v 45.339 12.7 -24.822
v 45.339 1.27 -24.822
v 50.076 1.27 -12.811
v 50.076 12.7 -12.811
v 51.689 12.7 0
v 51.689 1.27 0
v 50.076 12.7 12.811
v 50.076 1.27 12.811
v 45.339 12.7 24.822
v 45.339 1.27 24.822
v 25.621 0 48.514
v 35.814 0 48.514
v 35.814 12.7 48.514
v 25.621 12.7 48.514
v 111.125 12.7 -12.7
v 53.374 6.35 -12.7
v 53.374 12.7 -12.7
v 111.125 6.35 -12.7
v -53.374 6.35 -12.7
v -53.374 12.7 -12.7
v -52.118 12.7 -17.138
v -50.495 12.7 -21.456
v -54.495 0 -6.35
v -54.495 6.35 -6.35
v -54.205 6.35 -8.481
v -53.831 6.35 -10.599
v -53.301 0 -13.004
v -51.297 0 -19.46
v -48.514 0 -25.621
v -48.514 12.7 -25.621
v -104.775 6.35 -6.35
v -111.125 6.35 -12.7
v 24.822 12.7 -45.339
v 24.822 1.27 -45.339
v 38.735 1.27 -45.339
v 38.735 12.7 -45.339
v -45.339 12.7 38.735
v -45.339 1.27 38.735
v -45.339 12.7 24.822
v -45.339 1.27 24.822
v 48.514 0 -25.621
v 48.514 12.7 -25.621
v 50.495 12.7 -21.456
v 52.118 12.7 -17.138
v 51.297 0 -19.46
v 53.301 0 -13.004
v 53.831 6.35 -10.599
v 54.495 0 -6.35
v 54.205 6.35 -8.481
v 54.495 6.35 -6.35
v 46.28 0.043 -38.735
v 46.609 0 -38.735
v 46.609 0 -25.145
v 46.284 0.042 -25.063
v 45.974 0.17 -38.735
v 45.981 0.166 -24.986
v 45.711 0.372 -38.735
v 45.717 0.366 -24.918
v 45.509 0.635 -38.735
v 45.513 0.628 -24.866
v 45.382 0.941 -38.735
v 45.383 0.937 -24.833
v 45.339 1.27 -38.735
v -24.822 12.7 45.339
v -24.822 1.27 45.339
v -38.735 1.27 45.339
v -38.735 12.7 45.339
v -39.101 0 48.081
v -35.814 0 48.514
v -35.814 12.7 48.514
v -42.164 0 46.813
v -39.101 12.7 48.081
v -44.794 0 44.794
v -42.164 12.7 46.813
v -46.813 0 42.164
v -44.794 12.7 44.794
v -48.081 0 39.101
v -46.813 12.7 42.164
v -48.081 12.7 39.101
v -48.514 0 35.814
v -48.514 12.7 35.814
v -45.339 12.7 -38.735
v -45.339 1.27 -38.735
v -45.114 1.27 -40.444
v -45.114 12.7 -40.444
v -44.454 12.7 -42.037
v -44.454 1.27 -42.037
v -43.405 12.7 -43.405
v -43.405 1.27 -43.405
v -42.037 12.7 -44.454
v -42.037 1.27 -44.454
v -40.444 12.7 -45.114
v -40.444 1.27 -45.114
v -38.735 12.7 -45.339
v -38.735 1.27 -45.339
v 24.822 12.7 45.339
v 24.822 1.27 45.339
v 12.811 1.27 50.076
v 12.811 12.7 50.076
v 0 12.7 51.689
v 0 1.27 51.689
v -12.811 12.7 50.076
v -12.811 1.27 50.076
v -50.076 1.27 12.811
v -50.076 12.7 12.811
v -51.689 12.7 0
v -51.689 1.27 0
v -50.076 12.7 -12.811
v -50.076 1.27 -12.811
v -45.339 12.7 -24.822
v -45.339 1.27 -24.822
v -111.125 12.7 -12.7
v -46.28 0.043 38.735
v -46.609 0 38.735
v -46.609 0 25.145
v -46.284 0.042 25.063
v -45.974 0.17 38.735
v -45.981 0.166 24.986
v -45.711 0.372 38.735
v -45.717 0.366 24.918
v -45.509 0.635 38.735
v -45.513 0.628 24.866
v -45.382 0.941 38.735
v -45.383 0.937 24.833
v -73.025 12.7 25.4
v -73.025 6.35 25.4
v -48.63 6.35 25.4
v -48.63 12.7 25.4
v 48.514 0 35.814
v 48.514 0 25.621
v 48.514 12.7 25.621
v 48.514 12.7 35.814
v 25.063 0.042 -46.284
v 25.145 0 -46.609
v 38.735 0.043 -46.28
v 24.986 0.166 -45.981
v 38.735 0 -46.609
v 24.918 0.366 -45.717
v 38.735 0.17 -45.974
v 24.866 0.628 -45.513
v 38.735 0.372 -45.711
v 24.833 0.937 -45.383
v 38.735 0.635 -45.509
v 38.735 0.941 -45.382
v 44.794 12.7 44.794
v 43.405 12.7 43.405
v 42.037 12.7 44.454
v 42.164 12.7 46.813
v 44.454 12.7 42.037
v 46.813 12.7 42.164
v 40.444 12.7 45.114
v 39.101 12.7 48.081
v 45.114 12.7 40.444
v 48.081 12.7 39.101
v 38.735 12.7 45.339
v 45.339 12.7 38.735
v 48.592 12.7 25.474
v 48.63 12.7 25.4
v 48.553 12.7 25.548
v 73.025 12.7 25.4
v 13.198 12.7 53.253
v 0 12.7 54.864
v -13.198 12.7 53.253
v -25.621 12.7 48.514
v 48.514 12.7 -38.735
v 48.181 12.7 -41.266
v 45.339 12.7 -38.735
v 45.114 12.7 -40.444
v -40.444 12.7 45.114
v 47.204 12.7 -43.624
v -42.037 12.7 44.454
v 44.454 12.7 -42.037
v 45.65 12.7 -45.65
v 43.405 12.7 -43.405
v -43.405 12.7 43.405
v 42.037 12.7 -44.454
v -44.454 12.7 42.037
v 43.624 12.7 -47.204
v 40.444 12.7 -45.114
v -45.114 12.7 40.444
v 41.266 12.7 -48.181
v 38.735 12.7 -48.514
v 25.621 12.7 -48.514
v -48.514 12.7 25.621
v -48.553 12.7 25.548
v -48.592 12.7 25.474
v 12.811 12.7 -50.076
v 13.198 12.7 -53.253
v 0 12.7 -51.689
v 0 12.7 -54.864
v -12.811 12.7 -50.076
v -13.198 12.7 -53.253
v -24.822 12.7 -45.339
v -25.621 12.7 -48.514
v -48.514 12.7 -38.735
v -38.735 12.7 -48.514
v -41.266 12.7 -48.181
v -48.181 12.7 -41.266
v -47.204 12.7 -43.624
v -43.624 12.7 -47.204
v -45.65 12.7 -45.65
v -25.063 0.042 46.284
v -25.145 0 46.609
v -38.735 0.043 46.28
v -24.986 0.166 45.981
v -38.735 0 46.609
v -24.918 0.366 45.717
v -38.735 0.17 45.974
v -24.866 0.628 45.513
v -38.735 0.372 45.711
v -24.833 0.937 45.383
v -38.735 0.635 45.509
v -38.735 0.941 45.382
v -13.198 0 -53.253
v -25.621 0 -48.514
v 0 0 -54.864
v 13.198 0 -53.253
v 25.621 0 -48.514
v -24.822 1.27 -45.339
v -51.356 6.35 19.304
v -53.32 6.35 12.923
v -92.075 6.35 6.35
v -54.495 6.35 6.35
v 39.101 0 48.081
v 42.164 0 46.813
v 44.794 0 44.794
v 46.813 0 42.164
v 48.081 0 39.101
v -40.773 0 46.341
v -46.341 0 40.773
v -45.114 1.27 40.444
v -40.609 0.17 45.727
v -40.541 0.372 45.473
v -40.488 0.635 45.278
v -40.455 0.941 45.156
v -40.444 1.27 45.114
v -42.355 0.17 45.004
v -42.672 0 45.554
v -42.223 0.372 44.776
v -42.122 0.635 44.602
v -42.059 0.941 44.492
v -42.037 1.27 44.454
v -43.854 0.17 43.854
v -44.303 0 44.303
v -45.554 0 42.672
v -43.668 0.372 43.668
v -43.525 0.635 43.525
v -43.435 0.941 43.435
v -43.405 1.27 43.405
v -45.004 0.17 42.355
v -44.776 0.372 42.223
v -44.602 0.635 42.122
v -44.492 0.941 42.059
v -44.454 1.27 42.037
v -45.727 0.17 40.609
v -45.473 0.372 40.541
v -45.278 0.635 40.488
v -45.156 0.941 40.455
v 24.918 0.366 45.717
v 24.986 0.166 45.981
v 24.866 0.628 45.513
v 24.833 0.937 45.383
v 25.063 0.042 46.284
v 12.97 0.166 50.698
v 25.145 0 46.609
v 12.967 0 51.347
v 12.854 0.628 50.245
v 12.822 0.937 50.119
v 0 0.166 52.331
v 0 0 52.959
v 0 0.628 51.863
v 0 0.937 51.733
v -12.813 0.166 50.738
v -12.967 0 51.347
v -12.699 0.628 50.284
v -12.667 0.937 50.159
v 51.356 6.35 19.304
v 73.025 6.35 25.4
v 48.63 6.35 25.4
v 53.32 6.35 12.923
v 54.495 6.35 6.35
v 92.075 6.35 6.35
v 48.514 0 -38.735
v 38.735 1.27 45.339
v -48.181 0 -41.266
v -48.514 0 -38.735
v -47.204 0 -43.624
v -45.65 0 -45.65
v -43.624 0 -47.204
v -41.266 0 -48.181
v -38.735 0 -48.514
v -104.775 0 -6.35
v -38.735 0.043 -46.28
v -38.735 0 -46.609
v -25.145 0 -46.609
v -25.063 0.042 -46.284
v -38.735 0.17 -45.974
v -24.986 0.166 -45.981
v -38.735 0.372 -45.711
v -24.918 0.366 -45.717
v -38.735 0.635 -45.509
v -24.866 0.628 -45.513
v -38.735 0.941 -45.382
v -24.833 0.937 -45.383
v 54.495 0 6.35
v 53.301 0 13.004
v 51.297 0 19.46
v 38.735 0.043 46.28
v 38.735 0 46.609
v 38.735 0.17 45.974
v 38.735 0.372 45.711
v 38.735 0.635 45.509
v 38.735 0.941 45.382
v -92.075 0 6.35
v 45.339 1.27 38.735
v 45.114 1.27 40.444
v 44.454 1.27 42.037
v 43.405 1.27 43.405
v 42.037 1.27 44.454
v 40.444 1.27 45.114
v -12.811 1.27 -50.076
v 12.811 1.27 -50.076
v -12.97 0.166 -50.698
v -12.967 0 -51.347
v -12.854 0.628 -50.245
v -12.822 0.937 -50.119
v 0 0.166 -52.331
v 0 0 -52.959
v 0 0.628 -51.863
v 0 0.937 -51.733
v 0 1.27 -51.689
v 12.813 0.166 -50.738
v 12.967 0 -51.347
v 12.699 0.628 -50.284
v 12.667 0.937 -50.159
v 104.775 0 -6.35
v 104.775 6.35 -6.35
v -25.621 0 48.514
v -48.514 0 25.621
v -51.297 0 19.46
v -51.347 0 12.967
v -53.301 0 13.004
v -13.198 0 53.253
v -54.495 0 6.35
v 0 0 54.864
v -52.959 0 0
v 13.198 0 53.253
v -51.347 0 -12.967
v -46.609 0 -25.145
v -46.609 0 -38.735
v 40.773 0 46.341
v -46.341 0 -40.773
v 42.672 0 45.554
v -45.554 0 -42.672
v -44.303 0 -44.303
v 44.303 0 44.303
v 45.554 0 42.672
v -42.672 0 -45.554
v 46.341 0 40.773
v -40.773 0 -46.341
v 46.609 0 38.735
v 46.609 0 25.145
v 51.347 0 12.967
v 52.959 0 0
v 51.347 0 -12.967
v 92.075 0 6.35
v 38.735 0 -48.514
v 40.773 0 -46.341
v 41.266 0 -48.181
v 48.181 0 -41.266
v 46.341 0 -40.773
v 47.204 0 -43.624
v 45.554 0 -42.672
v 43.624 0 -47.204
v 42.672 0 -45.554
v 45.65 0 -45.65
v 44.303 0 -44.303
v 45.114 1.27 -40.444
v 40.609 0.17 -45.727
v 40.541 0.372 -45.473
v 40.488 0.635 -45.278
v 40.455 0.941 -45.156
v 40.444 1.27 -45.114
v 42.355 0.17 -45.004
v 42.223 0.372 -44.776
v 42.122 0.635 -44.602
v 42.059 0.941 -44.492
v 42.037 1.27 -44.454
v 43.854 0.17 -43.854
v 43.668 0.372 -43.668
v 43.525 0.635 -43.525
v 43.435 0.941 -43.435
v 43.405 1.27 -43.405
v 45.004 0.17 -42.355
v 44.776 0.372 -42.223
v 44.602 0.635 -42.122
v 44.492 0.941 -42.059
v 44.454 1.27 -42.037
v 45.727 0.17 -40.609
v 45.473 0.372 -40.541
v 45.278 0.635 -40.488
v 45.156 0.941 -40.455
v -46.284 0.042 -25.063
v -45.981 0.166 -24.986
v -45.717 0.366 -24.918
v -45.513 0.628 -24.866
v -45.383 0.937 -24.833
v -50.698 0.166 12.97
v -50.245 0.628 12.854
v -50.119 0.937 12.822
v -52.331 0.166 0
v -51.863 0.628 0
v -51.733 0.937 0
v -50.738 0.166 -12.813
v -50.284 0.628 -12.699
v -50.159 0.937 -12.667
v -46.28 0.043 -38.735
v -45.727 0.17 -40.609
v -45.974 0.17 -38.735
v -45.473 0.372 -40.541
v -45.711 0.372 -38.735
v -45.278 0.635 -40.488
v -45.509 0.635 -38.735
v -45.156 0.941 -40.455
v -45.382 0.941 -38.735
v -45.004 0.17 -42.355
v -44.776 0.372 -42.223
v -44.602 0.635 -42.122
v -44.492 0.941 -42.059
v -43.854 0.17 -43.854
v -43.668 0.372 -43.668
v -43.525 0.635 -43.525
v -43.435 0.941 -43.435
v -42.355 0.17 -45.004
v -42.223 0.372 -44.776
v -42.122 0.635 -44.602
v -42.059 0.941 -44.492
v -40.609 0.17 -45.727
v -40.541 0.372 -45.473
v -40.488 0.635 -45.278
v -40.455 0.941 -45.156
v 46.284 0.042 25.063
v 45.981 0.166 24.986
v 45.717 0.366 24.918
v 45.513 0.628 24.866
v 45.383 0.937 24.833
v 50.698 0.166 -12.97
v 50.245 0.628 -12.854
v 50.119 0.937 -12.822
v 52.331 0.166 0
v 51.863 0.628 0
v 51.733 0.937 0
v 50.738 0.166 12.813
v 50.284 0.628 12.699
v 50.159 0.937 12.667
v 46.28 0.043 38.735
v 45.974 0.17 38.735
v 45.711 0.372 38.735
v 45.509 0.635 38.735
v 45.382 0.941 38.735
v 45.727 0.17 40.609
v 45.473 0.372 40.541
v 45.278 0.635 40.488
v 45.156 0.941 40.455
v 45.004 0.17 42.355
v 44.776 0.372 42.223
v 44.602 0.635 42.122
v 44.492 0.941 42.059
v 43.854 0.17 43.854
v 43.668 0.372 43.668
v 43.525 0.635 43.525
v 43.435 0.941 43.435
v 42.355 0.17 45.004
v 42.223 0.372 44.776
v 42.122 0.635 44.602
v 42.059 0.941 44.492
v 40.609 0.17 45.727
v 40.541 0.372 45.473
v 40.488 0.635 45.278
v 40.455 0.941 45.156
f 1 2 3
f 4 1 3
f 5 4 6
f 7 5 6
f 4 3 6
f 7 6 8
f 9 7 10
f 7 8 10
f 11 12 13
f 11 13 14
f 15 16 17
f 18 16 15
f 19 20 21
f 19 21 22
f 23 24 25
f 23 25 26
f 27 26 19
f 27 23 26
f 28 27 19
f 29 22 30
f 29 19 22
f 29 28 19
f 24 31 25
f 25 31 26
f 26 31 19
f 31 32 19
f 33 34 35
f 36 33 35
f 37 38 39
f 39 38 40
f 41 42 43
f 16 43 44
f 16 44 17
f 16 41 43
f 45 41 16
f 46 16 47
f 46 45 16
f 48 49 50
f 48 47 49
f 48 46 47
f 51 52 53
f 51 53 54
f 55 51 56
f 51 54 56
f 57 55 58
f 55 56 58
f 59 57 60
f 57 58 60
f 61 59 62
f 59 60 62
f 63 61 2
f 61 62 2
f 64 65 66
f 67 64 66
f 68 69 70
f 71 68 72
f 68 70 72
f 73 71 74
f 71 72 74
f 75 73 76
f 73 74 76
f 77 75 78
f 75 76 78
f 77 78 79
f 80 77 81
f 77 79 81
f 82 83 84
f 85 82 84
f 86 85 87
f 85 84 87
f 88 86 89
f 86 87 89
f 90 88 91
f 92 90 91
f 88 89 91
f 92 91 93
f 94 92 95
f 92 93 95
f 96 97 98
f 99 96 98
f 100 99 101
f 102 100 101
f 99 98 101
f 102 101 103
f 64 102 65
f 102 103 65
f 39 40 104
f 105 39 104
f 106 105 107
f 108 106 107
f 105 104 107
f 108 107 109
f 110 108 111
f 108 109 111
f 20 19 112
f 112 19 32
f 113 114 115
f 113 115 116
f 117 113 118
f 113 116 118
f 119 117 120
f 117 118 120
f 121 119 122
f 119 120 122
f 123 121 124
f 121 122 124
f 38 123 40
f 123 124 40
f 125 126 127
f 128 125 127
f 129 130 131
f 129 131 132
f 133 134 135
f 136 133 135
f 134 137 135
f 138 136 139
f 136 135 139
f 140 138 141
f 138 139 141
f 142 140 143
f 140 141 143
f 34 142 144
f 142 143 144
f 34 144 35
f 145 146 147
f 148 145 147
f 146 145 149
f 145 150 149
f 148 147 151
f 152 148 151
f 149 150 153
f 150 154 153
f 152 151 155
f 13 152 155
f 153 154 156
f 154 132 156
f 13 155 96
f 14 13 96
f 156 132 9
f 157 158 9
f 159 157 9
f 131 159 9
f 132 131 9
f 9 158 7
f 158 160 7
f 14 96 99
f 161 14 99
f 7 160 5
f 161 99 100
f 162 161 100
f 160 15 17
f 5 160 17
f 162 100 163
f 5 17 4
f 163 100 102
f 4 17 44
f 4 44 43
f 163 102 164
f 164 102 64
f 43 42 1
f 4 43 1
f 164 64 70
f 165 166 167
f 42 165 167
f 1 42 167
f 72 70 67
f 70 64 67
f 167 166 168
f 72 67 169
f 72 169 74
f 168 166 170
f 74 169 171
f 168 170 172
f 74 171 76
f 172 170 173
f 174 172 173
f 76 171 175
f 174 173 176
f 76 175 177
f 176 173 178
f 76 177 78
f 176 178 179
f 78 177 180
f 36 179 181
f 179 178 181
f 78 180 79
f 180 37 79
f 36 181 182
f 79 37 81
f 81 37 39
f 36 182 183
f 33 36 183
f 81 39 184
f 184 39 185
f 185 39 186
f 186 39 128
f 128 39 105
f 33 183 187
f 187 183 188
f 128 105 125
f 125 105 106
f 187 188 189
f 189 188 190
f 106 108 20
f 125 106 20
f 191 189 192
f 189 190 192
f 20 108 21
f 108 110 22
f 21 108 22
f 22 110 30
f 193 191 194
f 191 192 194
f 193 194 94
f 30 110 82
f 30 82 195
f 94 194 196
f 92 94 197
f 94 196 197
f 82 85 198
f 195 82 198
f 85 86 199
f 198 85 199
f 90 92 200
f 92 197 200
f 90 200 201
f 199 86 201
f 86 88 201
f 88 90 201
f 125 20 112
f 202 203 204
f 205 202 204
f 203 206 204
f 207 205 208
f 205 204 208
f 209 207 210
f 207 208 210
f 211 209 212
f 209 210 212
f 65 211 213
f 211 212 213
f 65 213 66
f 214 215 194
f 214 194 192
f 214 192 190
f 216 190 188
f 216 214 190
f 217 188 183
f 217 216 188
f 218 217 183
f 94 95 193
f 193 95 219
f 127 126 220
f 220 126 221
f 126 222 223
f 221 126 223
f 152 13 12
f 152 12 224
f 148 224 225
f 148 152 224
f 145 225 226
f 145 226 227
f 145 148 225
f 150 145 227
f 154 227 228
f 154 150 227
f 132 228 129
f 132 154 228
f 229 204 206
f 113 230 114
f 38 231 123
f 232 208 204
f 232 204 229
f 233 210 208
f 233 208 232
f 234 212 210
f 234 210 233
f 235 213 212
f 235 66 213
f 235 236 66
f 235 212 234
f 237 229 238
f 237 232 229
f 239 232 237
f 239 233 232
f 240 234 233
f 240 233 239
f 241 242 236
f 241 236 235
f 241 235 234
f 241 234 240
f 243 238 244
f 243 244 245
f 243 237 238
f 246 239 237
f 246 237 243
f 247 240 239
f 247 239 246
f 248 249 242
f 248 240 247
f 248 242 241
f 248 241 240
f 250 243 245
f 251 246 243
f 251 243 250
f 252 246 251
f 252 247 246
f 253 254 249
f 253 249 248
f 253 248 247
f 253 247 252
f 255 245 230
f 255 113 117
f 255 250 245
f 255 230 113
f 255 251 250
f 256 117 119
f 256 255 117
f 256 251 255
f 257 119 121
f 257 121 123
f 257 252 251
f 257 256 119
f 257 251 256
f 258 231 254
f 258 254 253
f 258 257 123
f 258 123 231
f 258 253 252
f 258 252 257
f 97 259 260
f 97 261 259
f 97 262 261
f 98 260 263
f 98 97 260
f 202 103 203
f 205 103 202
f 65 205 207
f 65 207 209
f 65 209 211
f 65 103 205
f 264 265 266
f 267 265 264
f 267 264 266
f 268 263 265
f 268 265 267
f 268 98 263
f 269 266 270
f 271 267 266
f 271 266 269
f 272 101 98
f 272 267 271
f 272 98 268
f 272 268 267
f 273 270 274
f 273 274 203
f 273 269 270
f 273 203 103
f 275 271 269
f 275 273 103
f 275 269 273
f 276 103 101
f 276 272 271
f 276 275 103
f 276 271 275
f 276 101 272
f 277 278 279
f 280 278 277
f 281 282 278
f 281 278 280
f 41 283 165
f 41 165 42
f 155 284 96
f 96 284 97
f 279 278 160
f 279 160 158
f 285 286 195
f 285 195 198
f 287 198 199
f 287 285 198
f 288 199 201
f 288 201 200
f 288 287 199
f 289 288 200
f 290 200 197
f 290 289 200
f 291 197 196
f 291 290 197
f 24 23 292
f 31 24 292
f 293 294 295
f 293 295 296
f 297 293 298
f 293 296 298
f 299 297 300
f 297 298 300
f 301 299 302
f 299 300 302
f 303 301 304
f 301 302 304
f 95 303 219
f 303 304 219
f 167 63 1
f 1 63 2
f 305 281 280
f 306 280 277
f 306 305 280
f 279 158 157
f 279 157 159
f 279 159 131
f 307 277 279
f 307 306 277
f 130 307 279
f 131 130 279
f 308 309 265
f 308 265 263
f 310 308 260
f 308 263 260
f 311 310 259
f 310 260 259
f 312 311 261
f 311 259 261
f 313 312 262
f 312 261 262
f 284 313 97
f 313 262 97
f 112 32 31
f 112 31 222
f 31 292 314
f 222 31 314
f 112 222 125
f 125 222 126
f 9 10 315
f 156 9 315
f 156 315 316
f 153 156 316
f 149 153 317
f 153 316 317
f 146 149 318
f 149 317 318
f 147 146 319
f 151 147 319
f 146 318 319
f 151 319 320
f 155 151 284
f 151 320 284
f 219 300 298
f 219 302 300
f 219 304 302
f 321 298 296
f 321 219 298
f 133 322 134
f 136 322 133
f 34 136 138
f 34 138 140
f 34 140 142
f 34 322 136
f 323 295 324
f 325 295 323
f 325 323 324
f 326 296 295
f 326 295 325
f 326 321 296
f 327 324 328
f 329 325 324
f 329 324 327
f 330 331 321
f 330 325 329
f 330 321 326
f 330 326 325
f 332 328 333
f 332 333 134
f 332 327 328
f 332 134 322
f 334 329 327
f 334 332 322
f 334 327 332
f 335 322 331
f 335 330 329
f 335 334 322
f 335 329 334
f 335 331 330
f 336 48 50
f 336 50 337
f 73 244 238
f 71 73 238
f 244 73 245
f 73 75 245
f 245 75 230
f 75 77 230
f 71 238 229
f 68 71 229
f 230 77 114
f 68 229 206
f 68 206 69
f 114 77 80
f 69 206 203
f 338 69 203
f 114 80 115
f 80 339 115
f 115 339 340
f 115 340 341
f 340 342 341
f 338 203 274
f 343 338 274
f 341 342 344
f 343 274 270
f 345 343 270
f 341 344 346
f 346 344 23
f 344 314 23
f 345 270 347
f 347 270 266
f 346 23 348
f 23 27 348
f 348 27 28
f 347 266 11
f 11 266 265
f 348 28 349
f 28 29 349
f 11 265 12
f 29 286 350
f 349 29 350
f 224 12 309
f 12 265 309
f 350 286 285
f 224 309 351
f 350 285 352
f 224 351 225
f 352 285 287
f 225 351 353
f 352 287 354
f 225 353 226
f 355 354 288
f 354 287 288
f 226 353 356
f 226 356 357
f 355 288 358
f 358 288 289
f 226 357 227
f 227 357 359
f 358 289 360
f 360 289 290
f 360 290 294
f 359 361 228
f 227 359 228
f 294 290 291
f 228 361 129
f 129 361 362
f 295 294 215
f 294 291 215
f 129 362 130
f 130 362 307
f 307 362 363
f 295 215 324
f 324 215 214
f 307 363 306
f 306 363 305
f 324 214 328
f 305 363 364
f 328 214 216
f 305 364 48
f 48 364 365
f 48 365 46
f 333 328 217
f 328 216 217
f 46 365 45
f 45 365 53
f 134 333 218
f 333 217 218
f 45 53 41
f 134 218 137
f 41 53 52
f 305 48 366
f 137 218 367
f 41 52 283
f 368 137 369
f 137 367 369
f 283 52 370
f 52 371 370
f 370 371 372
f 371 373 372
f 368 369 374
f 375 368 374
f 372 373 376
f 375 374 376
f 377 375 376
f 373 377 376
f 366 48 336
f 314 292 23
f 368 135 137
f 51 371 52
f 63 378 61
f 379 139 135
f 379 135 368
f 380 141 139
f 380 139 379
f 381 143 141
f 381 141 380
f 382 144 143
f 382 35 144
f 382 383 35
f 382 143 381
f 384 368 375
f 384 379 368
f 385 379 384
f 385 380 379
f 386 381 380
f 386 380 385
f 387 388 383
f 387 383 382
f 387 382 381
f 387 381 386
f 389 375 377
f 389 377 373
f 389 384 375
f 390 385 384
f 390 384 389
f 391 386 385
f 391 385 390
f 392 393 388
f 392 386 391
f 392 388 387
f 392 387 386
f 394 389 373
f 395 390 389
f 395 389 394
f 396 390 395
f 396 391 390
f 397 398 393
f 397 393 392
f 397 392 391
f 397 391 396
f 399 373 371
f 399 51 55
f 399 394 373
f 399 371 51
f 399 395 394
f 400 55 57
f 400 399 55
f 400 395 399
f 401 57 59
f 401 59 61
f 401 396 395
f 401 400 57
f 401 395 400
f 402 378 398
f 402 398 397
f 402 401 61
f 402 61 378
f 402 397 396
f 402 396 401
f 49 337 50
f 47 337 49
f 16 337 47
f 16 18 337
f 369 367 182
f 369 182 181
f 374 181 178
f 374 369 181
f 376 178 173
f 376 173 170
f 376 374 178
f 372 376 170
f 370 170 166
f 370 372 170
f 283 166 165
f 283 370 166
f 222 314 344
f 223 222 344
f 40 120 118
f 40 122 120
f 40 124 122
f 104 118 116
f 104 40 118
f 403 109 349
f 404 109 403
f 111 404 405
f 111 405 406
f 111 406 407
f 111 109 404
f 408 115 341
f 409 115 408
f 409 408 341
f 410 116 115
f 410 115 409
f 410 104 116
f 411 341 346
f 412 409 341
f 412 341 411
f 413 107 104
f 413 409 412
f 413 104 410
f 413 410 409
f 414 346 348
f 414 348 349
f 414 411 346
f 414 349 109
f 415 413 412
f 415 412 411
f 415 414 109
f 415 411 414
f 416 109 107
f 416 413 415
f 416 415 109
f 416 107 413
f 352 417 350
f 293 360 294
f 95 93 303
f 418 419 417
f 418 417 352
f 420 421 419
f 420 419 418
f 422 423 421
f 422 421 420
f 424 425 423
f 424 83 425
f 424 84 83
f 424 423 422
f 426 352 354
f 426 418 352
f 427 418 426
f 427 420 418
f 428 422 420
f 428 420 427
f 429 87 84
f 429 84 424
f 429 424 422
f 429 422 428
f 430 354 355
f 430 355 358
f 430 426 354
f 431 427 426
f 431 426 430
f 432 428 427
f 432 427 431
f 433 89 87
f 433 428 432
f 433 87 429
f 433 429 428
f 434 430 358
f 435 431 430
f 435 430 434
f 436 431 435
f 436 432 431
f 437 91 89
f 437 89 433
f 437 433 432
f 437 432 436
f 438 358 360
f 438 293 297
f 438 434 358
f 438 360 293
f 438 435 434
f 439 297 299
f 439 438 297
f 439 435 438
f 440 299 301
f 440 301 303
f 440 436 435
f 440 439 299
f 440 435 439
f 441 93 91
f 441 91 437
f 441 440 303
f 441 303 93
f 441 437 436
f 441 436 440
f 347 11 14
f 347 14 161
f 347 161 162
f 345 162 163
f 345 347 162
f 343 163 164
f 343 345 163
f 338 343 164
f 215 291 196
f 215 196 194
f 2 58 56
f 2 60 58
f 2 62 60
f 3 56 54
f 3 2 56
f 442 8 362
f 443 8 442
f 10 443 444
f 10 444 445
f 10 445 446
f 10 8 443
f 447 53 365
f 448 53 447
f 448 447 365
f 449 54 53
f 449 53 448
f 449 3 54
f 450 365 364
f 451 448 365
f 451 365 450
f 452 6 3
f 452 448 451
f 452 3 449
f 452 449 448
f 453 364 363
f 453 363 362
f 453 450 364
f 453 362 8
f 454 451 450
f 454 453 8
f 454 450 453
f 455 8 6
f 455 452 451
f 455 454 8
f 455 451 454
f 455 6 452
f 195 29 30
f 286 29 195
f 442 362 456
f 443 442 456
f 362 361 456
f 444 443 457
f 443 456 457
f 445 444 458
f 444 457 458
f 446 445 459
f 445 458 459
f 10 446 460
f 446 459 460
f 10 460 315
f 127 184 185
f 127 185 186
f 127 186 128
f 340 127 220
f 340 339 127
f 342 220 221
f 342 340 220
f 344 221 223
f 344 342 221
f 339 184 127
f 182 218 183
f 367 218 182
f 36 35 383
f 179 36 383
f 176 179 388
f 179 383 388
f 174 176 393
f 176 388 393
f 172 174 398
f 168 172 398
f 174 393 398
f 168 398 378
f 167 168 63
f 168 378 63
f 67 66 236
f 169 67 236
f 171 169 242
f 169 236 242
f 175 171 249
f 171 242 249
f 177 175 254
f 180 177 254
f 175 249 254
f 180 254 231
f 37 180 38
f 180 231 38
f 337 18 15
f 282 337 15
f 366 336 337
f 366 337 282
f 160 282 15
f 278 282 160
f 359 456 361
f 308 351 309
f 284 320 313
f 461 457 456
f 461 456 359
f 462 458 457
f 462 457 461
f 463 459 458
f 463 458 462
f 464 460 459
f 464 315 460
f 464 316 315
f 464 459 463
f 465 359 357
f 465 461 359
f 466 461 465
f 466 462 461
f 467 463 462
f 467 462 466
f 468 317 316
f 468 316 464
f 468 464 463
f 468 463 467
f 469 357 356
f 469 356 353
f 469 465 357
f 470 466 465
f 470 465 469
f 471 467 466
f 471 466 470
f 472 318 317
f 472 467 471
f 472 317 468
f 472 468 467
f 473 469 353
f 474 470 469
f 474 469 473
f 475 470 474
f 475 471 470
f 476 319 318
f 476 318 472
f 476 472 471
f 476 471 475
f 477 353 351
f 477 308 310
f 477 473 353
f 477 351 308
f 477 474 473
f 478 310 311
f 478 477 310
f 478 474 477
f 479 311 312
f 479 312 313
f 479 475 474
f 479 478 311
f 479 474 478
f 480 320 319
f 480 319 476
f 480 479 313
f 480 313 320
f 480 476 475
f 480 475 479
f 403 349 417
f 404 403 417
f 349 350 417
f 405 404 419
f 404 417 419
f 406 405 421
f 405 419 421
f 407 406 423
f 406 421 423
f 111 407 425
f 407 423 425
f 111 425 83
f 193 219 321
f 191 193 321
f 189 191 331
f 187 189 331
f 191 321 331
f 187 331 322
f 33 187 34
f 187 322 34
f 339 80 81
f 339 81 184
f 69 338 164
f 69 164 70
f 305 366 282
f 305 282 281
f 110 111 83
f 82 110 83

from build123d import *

# Parameters (mm, degrees)
SKETCH1_W           = 254
SKETCH1_H           = 152.4
BOSS_EXTRUDE1_DEPTH = 12.7
SKETCH4_OUTSIDE_W   = 315.296
SKETCH4_OUTSIDE_H   = 213.696
CUT_EXTRUDE1_DEPTH  = 13.7
BOSS_EXTRUDE2_DEPTH = 6.35
BOSS_EXTRUDE3_START = 6.35
BOSS_EXTRUDE3_DEPTH = 6.35
FILLET1_R           = 1.27
CUT_EXTRUDE3_DEPTH  = 13.7000001


with BuildPart() as part:
    # Sketch1 → Boss-Extrude1 (new body)
    with BuildSketch(Plane(origin=(0, 0, 0), x_dir=(1, 0, 0), z_dir=(0, 1, 0))):
        Rectangle(SKETCH1_W, SKETCH1_H)
    extrude(amount=BOSS_EXTRUDE1_DEPTH)

    # Sketch4 outside → Cut-Extrude1 (cut, through all)
    with BuildSketch(Plane.XZ):
        Rectangle(SKETCH4_OUTSIDE_W, SKETCH4_OUTSIDE_H)
        with BuildLine():
            Line((48.514, 25.621286072), (48.514, 38.735))
            ThreePointArc((48.514, 38.735), (45.649797213, 45.649797213), (38.735, 48.514))
            Line((38.735, 48.514), (25.621286072, 48.514))
            ThreePointArc((25.621286072, 48.514), (0, 54.864), (-25.621286072, 48.514))
            Line((-25.621286072, 48.514), (-38.735, 48.514))
            ThreePointArc((-38.735, 48.514), (-45.649797213, 45.649797213), (-48.514, 38.735))
            Line((-48.514, 38.735), (-48.514, 25.621286072))
            ThreePointArc((-48.514, 25.621286072), (-54.864, 0), (-48.514, -25.621286072))
            Line((-48.514, -25.621286072), (-48.514, -38.735))
            ThreePointArc((-48.514, -38.735), (-45.649797213, -45.649797213), (-38.735, -48.514))
            Line((-38.735, -48.514), (-25.621286072, -48.514))
            ThreePointArc((-25.621286072, -48.514), (0, -54.864), (25.621286072, -48.514))
            Line((25.621286072, -48.514), (38.735, -48.514))
            ThreePointArc((38.735, -48.514), (45.649797213, -45.649797213), (48.514, -38.735))
            Line((48.514, -38.735), (48.514, -25.621286072))
            ThreePointArc((48.514, -25.621286072), (54.864, 0), (48.514, 25.621286072))
        make_face(mode=Mode.SUBTRACT)
        with BuildLine():
            Line((45.339, 24.821921763), (45.339, 38.735))
            ThreePointArc((45.339, 38.735), (43.404733183, 43.404733183), (38.735, 45.339))
            Line((38.735, 45.339), (24.821921763, 45.339))
            ThreePointArc((24.821921763, 45.339), (0, 51.689), (-24.821921763, 45.339))
            Line((-24.821921763, 45.339), (-38.735, 45.339))
            ThreePointArc((-38.735, 45.339), (-43.404733183, 43.404733183), (-45.339, 38.735))
            Line((-45.339, 38.735), (-45.339, 24.821921763))
            ThreePointArc((-45.339, 24.821921763), (-51.689, 0), (-45.339, -24.821921763))
            Line((-45.339, -24.821921763), (-45.339, -38.735))
            ThreePointArc((-45.339, -38.735), (-43.404733183, -43.404733183), (-38.735, -45.339))
            Line((-38.735, -45.339), (-24.821921763, -45.339))
            ThreePointArc((-24.821921763, -45.339), (0, -51.689), (24.821921763, -45.339))
            Line((24.821921763, -45.339), (38.735, -45.339))
            ThreePointArc((38.735, -45.339), (43.404733183, -43.404733183), (45.339, -38.735))
            Line((45.339, -38.735), (45.339, -24.821921763))
            ThreePointArc((45.339, -24.821921763), (51.689, 0), (45.339, 24.821921763))
        make_face()
    extrude(amount=-CUT_EXTRUDE1_DEPTH, mode=Mode.SUBTRACT)

    # Sketch5 → Boss-Extrude2 (add)
    with BuildSketch(Plane(origin=(0, 0, 0), x_dir=(1, 0, 0), z_dir=(0, 1, 0))):
        with BuildLine():
            Line((54.495284163, 6.35), (104.775, 6.35))
            Line((104.775, 6.35), (92.075, -6.35))
            Line((92.075, -6.35), (54.495284163, -6.35))
            ThreePointArc((54.495284163, -6.35), (54.864, 0), (54.495284163, 6.35))
        make_face()
        with BuildLine():
            Line((-92.075, -6.35), (-54.495284163, -6.35))
            ThreePointArc((-54.495284163, -6.35), (-54.864, 0), (-54.495284163, 6.35))
            Line((-54.495284163, 6.35), (-104.775, 6.35))
            Line((-104.775, 6.35), (-92.075, -6.35))
        make_face()
    extrude(amount=BOSS_EXTRUDE2_DEPTH)

    # Sketch6 → Boss-Extrude3 (add)
    with BuildSketch(Plane(origin=(0, 0, 0), x_dir=(1, 0, 0), z_dir=(0, 1, 0)).offset(BOSS_EXTRUDE3_START)):
        with BuildLine():
            Line((53.373855922, 12.7), (111.125, 12.7))
            Line((111.125, 12.7), (73.025, -25.4))
            Line((73.025, -25.4), (48.630222043, -25.4))
            ThreePointArc((48.630222043, -25.4), (54.443644996, -6.778496559), (53.373855922, 12.7))
        make_face()
        with BuildLine():
            Line((-73.025, -25.4), (-48.630222043, -25.4))
            ThreePointArc((-48.630222043, -25.4), (-54.443644996, -6.778496559), (-53.373855922, 12.7))
            Line((-53.373855922, 12.7), (-111.125, 12.7))
            Line((-111.125, 12.7), (-73.025, -25.4))
        make_face()
    extrude(amount=BOSS_EXTRUDE3_DEPTH)

    # Fillet1
    fillet1_edges = [part.edges().sort_by_distance(p)[0] for p in [
        (51.689, 0, 0),
        (45.339, 0, 31.778460881),
        (43.404733183, 0, 43.404733183),
        (31.778460881, 0, 45.339),
        (0, 0, 51.689),
        (-31.778460881, 0, 45.339),
        (-43.404733183, 0, 43.404733183),
        (-45.339, 0, 31.778460881),
        (-51.689, 0, 0),
        (-45.339, 0, -31.778460881),
        (-43.404733183, 0, -43.404733183),
        (-31.778460881, 0, -45.339),
        (0, 0, -51.689),
        (31.778460881, 0, -45.339),
        (43.404733183, 0, -43.404733183),
        (45.339, 0, -31.778460881),
    ]]
    fillet(fillet1_edges, radius=FILLET1_R)

    # Sketch9 → Cut-Extrude3 (cut, through all)
    with BuildSketch(Plane(origin=(0, 12.7, 0), x_dir=(1, 0, 0), z_dir=(0, 1, 0))):
        with BuildLine():
            Line((38.735, -48.514), (35.814, -48.514))
            ThreePointArc((35.814, -48.514), (44.794256121, -44.794256121), (48.514, -35.814))
            Line((48.514, -35.814), (48.514, -38.735))
            ThreePointArc((48.514, -38.735), (45.649797213, -45.649797213), (38.735, -48.514))
        make_face()
        with BuildLine():
            Line((-48.514, -35.814), (-48.514, -38.735))
            ThreePointArc((-48.514, -38.735), (-45.649797213, -45.649797213), (-38.735, -48.514))
            Line((-38.735, -48.514), (-35.814, -48.514))
            ThreePointArc((-35.814, -48.514), (-44.794256121, -44.794256121), (-48.514, -35.814))
        make_face()
    extrude(amount=-CUT_EXTRUDE3_DEPTH, mode=Mode.SUBTRACT)


solid = part.part
